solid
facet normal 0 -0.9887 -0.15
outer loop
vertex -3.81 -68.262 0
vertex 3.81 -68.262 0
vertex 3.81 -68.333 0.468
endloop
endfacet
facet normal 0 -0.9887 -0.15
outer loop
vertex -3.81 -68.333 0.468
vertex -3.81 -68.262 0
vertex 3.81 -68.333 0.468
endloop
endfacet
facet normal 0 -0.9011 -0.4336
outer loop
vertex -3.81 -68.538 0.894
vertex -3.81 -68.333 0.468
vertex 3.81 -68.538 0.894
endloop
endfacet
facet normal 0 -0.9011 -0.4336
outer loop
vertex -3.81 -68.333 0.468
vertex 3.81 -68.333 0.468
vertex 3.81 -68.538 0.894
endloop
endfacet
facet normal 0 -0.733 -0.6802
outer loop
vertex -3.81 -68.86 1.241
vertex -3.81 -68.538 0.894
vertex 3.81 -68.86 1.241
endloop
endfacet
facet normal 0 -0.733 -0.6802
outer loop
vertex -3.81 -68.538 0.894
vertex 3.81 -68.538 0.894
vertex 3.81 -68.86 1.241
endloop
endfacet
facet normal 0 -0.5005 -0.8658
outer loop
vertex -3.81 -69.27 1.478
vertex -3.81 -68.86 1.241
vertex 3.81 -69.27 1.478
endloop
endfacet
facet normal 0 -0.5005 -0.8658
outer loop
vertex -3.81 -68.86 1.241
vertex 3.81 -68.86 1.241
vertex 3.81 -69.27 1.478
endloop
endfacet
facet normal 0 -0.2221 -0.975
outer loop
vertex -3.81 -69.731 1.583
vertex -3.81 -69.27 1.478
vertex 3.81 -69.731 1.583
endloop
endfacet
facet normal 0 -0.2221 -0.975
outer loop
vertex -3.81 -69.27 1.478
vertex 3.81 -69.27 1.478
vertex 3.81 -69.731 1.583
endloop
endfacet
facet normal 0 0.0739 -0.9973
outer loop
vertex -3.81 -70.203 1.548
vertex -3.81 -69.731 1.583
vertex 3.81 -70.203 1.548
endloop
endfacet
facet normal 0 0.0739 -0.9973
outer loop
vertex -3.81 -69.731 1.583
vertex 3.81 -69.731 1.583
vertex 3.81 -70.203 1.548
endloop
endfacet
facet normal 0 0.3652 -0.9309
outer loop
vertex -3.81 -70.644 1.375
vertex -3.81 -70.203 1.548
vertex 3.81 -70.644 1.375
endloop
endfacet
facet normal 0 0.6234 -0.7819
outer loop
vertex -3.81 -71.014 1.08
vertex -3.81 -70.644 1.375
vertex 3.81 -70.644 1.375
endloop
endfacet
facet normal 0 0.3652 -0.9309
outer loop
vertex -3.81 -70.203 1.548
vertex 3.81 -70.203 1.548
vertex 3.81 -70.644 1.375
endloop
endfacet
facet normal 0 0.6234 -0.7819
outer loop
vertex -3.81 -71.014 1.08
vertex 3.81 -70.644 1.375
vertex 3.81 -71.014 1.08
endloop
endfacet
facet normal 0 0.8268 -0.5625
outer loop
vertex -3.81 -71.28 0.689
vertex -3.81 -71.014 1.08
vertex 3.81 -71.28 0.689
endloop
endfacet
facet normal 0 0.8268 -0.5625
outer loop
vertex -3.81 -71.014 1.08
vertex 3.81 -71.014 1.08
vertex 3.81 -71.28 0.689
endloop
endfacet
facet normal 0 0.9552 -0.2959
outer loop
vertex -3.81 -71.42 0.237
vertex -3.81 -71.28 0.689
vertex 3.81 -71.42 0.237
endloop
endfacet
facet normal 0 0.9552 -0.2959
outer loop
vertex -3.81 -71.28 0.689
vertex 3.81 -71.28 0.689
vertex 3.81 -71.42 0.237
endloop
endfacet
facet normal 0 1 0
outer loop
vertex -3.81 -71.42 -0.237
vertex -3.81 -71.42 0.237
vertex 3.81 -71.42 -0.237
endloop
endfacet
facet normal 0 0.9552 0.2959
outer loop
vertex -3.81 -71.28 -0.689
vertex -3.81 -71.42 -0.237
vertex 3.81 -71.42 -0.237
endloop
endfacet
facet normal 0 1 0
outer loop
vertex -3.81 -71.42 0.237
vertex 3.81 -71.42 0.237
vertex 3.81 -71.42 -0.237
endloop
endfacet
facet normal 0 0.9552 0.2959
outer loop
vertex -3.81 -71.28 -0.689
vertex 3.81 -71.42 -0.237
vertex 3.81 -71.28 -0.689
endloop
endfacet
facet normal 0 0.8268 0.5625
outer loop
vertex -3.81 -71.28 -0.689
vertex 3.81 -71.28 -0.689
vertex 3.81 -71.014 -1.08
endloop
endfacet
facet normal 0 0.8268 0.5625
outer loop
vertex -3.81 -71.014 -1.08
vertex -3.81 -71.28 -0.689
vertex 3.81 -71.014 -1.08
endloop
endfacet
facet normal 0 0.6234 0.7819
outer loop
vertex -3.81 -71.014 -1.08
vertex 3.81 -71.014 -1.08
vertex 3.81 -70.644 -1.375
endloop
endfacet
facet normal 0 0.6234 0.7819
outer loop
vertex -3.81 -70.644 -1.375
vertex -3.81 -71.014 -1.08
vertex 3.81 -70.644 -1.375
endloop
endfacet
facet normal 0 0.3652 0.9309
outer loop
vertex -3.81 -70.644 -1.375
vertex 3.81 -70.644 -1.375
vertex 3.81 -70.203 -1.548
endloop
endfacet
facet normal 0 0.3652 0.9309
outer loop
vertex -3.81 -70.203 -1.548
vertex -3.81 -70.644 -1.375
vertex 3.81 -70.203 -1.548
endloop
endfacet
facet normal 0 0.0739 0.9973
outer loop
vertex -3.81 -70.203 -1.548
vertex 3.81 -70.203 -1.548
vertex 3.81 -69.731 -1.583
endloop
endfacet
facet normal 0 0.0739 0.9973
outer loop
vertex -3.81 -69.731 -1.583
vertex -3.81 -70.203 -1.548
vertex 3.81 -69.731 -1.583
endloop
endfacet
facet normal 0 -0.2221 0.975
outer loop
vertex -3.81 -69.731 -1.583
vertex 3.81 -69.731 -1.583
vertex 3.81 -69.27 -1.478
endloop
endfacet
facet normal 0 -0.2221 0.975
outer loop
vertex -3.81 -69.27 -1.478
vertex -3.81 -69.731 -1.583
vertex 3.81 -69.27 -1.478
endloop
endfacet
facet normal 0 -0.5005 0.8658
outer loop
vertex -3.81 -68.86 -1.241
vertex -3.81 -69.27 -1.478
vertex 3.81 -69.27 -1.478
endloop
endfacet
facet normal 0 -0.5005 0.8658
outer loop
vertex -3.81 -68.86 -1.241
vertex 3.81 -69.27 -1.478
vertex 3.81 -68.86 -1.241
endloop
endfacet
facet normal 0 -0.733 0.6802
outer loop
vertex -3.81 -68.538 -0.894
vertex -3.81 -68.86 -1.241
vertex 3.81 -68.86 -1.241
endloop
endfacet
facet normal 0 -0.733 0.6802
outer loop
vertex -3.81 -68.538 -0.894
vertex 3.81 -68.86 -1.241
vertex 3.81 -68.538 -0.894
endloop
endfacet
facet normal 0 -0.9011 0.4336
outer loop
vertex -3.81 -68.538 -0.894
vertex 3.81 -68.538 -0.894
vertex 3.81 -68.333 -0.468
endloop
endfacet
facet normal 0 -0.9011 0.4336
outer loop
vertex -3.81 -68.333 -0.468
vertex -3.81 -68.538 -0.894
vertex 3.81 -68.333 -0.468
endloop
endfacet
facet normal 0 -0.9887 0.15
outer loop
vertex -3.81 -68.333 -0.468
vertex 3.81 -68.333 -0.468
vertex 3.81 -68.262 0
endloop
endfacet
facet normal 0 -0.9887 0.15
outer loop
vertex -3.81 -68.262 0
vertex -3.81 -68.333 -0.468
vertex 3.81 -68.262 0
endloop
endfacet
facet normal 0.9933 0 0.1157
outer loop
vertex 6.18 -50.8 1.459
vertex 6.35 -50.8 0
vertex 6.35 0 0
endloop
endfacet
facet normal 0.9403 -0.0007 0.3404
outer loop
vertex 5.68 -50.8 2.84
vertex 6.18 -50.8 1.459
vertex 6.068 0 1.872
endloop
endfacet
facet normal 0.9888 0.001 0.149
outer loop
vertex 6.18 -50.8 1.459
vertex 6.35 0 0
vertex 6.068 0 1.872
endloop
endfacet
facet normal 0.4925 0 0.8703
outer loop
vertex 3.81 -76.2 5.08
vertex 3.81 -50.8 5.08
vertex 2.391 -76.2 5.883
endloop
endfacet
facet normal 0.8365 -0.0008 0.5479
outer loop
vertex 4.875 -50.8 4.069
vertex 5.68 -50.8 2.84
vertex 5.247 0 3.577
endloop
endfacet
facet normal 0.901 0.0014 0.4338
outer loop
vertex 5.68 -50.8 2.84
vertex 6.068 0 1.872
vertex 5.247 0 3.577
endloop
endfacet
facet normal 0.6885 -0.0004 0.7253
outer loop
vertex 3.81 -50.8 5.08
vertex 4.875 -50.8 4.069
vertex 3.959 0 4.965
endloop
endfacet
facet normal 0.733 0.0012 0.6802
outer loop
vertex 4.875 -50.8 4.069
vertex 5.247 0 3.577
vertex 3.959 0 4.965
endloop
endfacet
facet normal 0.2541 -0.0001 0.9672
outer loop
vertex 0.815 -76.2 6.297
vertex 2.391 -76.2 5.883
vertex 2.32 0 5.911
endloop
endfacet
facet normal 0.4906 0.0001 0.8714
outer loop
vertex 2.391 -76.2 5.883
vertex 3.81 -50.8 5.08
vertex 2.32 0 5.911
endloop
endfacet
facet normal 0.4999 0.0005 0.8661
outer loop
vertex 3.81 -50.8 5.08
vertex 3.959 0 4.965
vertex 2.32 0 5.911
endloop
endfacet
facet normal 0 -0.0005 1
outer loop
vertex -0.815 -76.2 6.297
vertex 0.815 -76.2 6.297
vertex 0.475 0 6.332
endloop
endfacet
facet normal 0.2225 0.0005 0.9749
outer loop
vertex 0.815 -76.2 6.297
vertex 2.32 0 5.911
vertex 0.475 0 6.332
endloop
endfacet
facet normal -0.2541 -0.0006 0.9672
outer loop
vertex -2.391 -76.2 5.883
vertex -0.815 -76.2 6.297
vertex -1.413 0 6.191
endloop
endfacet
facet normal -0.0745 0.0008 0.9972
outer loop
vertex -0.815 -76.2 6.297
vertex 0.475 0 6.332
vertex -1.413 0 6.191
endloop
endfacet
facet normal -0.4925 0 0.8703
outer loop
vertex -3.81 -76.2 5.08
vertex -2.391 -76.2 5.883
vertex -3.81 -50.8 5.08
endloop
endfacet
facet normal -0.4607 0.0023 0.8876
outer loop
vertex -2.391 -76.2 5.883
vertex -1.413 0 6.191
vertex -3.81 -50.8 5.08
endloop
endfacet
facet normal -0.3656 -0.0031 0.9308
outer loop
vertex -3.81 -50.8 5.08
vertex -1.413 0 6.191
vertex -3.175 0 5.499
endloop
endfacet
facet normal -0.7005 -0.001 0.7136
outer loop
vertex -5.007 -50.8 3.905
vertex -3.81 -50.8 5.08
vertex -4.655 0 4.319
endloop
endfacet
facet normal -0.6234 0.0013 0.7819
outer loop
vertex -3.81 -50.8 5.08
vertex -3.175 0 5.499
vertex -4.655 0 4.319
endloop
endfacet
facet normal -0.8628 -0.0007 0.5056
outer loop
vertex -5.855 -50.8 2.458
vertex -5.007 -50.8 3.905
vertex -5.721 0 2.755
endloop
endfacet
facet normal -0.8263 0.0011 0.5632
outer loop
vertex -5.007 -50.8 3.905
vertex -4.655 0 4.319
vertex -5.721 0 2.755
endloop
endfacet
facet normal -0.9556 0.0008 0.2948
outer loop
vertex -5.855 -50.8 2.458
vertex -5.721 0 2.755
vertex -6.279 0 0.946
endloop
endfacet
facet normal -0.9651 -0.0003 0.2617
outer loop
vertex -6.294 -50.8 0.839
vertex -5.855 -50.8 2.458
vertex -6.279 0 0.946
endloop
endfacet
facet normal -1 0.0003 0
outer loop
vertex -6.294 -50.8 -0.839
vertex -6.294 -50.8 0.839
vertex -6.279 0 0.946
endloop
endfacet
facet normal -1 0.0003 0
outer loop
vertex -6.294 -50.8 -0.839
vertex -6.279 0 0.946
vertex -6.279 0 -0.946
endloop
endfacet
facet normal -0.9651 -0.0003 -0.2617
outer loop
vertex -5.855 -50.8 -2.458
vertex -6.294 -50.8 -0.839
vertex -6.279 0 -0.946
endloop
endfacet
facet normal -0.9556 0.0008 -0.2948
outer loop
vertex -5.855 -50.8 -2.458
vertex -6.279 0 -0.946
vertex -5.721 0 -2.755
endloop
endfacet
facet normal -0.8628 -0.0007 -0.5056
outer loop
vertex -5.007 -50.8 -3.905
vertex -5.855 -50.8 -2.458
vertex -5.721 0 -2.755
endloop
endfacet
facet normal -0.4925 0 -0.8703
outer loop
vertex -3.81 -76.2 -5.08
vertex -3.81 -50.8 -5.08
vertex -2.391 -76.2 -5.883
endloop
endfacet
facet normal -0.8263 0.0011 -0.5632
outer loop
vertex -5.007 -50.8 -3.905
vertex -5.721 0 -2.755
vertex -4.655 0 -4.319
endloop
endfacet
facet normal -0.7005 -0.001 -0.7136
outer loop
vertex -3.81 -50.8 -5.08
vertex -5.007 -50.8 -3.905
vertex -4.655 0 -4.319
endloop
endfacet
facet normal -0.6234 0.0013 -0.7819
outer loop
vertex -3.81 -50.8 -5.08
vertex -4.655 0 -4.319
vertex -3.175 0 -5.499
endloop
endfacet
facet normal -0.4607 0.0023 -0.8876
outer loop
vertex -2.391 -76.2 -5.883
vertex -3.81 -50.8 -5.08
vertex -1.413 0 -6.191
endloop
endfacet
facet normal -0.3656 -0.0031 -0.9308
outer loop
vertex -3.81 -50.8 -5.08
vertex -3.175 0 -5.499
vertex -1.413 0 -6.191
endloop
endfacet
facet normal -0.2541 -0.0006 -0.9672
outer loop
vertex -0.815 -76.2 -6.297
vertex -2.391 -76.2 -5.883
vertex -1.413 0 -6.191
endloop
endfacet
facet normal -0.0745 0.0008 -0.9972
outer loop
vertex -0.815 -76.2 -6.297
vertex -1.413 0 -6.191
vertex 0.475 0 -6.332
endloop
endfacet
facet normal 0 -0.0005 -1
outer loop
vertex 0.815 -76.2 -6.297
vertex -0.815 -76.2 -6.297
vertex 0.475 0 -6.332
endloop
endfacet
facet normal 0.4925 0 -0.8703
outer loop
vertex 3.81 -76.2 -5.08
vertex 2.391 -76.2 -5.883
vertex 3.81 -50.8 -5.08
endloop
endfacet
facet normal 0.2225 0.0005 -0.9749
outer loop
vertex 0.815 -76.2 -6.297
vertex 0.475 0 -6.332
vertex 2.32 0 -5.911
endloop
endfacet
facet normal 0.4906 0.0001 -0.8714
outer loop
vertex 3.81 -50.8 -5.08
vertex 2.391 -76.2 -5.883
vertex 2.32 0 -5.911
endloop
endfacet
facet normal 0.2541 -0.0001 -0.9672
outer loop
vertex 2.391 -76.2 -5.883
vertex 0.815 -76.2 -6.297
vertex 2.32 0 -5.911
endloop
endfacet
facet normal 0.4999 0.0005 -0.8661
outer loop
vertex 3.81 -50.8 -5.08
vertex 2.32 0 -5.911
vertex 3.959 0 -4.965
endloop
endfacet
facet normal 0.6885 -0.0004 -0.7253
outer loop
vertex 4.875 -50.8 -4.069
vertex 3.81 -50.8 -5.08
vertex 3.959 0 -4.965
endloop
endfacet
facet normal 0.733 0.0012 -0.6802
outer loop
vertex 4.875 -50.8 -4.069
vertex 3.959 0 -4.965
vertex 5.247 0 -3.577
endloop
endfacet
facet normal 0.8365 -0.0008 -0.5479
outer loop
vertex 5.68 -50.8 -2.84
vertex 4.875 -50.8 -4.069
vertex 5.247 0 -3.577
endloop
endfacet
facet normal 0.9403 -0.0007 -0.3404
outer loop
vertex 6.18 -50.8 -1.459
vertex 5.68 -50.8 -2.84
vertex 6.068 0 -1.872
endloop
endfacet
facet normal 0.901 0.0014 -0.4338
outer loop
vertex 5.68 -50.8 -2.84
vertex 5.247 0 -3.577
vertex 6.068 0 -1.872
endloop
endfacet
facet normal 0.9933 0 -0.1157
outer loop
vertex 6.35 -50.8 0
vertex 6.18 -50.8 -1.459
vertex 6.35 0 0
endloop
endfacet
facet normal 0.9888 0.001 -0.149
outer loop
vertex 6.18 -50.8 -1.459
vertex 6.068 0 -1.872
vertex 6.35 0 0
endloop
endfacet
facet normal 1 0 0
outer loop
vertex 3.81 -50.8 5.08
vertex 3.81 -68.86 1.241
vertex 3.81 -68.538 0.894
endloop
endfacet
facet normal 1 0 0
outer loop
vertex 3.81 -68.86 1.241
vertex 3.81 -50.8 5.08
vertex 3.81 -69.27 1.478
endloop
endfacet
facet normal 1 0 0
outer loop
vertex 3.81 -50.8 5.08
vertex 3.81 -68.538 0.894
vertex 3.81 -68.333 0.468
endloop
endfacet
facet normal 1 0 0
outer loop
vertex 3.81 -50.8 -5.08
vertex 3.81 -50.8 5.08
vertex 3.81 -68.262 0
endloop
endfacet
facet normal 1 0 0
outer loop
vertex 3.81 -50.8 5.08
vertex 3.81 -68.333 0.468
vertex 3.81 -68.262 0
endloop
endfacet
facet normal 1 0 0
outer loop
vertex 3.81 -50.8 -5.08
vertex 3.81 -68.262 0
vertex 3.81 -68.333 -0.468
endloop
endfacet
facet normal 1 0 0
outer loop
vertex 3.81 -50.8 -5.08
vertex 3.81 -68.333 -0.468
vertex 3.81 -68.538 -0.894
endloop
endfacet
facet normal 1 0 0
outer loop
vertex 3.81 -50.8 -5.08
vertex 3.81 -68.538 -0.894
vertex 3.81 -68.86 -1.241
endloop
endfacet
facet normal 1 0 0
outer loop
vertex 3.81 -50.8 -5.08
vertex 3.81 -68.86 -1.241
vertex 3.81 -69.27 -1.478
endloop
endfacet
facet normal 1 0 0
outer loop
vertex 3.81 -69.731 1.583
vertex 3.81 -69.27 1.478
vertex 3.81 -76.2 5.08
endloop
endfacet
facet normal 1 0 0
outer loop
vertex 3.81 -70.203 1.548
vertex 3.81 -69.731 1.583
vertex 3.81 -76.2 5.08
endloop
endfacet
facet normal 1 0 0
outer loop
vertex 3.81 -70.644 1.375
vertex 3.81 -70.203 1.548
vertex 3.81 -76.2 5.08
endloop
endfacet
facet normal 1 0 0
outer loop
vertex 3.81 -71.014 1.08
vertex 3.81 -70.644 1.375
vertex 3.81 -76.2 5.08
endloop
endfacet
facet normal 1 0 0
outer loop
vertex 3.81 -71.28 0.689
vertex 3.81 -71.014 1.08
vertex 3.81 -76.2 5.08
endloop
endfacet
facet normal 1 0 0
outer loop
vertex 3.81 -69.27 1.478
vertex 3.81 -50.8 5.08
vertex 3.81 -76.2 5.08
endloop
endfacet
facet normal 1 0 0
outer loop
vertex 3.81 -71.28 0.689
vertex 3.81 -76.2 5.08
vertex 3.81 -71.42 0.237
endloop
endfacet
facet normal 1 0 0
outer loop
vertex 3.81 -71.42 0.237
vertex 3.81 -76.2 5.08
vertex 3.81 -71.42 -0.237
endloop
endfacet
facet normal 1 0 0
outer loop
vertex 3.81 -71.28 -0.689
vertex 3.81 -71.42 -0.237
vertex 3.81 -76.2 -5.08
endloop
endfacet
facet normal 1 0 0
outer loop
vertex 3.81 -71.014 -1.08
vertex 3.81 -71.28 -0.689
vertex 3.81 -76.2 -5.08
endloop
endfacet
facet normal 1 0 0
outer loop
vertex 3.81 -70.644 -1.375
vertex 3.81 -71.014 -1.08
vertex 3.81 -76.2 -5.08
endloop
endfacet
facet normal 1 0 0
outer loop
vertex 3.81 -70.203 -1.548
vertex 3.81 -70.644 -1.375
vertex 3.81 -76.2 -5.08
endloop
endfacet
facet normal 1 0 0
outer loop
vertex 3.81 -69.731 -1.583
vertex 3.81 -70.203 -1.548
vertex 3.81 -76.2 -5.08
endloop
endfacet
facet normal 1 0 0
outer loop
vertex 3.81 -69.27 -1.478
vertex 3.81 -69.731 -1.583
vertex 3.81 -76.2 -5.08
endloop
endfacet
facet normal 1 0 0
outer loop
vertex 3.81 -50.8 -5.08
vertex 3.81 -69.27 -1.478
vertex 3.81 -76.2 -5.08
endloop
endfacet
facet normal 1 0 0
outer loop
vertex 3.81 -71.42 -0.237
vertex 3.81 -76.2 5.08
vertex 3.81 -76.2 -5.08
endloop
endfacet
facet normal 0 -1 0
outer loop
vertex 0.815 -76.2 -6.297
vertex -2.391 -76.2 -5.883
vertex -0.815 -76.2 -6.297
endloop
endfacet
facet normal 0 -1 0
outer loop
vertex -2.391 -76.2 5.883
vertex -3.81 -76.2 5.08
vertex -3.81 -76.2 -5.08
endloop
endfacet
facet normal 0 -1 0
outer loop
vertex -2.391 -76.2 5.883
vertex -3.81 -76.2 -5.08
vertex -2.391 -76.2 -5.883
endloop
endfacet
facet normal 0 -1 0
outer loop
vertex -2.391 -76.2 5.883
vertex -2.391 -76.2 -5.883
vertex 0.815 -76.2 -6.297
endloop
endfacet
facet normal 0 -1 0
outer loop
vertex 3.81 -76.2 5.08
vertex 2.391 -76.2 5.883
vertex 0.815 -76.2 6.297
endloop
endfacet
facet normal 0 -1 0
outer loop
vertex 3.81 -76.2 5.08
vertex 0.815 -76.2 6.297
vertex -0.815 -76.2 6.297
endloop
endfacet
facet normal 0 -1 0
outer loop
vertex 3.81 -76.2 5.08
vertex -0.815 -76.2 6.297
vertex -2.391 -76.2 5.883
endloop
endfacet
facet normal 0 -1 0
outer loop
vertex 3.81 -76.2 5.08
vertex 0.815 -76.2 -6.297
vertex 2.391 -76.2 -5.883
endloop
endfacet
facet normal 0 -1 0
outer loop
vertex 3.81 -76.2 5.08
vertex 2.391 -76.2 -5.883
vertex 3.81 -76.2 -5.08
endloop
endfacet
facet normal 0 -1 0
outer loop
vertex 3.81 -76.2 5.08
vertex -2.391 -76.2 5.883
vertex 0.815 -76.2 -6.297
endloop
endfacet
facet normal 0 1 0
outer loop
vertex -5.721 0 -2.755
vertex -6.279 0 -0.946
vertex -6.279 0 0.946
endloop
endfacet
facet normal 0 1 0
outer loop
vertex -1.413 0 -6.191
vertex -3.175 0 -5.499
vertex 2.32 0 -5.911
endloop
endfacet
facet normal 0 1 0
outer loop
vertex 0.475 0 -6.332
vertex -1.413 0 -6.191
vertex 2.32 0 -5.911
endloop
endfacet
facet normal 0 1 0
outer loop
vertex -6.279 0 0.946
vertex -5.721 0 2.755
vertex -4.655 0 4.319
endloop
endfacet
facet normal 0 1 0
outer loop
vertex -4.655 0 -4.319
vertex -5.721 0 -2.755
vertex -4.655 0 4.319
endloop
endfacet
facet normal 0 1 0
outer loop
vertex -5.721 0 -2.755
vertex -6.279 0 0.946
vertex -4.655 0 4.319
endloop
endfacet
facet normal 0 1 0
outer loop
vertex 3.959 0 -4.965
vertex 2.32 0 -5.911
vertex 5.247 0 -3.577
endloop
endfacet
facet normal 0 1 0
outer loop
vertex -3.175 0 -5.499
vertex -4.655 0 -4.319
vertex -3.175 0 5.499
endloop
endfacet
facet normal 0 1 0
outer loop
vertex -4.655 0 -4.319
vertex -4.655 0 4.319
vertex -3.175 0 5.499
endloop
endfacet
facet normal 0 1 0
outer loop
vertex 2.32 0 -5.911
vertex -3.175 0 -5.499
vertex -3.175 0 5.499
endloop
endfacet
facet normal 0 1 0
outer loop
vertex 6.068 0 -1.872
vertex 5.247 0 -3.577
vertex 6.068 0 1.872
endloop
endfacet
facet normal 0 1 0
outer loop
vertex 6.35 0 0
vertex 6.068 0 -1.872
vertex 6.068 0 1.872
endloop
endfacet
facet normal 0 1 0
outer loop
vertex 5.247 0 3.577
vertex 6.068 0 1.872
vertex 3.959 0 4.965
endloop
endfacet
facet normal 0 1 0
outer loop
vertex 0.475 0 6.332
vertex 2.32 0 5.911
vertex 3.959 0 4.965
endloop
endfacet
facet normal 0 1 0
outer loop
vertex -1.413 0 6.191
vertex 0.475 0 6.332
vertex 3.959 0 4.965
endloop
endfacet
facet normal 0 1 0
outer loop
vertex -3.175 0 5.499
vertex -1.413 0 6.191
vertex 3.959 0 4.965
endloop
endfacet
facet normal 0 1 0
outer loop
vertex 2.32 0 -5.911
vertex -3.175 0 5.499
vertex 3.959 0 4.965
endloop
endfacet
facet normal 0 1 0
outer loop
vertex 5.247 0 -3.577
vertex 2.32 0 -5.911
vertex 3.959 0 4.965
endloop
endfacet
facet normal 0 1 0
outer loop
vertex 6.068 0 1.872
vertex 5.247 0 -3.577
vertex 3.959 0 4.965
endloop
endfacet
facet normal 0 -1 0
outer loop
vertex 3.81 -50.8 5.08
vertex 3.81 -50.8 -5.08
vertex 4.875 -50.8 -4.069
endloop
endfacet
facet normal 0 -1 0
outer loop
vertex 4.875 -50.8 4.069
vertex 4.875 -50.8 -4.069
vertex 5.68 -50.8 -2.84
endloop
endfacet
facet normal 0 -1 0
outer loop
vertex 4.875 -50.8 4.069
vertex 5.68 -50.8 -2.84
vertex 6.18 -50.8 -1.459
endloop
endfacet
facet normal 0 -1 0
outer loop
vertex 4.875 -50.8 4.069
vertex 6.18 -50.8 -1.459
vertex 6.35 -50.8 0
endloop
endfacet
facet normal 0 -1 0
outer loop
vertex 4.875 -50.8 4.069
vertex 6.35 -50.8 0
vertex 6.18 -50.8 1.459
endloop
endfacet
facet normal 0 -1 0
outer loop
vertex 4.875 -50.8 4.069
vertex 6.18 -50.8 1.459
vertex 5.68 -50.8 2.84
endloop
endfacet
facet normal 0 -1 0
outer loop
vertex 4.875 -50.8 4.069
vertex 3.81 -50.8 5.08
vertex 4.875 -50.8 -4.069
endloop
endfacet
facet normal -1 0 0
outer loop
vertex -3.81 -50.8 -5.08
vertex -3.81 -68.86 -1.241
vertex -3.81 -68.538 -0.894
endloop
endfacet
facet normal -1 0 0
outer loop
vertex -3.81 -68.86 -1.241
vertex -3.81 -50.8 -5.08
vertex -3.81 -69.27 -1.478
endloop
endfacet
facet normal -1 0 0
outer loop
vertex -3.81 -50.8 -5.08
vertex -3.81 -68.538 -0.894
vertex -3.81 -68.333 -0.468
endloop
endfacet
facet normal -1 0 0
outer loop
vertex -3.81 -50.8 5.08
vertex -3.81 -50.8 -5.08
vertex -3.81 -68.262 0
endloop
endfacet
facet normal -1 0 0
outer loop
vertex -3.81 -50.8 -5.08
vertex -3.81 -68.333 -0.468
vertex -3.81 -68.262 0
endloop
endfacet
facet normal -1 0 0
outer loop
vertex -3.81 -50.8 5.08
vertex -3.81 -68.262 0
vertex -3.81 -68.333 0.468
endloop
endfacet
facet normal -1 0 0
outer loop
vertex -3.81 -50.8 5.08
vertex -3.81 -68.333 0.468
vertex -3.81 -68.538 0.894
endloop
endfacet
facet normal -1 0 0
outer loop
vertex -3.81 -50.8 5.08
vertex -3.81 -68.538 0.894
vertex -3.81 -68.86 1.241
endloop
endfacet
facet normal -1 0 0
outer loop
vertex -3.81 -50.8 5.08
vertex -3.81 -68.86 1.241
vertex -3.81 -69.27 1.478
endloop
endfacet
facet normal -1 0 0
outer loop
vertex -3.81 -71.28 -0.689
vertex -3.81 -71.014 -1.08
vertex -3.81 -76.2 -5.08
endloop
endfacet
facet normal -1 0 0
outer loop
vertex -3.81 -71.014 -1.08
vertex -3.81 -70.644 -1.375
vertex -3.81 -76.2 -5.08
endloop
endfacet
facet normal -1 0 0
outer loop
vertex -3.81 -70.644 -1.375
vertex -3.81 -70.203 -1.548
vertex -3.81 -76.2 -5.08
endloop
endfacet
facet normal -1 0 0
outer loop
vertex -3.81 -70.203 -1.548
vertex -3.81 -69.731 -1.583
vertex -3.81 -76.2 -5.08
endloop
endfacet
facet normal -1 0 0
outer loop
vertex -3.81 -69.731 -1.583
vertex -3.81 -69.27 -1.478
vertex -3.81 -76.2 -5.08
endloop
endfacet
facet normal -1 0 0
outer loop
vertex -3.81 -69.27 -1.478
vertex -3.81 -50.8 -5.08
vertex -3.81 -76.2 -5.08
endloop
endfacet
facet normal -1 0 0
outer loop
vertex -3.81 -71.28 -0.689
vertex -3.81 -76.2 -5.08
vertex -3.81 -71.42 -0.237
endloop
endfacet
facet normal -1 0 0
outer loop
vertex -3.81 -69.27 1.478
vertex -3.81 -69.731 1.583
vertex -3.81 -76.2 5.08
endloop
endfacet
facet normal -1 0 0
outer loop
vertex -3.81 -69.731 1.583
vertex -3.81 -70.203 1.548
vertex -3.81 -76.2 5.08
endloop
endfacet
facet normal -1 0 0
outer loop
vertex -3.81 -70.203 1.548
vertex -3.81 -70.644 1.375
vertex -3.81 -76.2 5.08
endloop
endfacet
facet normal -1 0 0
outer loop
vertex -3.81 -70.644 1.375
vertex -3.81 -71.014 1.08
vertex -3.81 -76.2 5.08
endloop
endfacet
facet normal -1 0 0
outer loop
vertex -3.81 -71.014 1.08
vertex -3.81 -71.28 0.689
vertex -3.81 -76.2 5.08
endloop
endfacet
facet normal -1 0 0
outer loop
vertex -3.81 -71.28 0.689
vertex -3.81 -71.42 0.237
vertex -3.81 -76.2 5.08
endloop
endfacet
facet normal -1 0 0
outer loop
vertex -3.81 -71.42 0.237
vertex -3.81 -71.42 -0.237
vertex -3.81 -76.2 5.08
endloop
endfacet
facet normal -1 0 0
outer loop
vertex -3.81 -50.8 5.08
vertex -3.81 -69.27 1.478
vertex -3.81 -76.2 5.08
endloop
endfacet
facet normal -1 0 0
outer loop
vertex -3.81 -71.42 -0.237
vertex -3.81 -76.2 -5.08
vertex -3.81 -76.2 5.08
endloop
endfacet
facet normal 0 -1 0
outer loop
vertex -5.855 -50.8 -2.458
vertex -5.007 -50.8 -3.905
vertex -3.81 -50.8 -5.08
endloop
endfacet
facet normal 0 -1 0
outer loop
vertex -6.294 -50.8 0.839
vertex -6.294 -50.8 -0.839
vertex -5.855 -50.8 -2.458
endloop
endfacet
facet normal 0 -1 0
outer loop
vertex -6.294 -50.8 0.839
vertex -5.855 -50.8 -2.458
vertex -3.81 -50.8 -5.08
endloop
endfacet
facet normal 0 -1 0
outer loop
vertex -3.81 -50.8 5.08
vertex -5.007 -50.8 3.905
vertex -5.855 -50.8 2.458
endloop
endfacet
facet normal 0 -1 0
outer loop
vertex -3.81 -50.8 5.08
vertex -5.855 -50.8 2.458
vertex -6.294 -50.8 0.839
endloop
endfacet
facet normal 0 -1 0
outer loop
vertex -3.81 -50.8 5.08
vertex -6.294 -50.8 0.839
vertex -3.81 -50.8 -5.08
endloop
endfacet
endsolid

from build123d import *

# Parameters (mm, degrees)
F0_R     = 6.35
F1_DEPTH = 76.2
F3_DEPTH = 25.4
F4_R     = 1.5875
F5_DEPTH = 25.4


with BuildPart() as f1:
    # F0 (on Front) → F1 (new body)
    with BuildSketch(Plane.XZ):
        Circle(F0_R)
    extrude(amount=F1_DEPTH)

    # F2 (on face) → F3 (cut)
    with BuildSketch(Plane.XZ.offset(76.2)):
        with BuildLine():
            ThreePointArc((3.81, -5.08), (6.35, 0), (3.81, 5.08))
            Line((3.81, 5.08), (3.81, -5.08))
        make_face()
        with BuildLine():
            Line((-3.81, -5.08), (-3.81, 5.08))
            ThreePointArc((-3.81, 5.08), (-6.35, 0), (-3.81, -5.08))
        make_face()
    extrude(amount=-F3_DEPTH, mode=Mode.SUBTRACT)

    # F4 (on face) → F5 (cut)
    with BuildSketch(Plane.YZ.offset(3.81)):
        with Locations((-69.85, 0)):
            Circle(F4_R)
    extrude(amount=-F5_DEPTH, mode=Mode.SUBTRACT)


solid = f1.part
